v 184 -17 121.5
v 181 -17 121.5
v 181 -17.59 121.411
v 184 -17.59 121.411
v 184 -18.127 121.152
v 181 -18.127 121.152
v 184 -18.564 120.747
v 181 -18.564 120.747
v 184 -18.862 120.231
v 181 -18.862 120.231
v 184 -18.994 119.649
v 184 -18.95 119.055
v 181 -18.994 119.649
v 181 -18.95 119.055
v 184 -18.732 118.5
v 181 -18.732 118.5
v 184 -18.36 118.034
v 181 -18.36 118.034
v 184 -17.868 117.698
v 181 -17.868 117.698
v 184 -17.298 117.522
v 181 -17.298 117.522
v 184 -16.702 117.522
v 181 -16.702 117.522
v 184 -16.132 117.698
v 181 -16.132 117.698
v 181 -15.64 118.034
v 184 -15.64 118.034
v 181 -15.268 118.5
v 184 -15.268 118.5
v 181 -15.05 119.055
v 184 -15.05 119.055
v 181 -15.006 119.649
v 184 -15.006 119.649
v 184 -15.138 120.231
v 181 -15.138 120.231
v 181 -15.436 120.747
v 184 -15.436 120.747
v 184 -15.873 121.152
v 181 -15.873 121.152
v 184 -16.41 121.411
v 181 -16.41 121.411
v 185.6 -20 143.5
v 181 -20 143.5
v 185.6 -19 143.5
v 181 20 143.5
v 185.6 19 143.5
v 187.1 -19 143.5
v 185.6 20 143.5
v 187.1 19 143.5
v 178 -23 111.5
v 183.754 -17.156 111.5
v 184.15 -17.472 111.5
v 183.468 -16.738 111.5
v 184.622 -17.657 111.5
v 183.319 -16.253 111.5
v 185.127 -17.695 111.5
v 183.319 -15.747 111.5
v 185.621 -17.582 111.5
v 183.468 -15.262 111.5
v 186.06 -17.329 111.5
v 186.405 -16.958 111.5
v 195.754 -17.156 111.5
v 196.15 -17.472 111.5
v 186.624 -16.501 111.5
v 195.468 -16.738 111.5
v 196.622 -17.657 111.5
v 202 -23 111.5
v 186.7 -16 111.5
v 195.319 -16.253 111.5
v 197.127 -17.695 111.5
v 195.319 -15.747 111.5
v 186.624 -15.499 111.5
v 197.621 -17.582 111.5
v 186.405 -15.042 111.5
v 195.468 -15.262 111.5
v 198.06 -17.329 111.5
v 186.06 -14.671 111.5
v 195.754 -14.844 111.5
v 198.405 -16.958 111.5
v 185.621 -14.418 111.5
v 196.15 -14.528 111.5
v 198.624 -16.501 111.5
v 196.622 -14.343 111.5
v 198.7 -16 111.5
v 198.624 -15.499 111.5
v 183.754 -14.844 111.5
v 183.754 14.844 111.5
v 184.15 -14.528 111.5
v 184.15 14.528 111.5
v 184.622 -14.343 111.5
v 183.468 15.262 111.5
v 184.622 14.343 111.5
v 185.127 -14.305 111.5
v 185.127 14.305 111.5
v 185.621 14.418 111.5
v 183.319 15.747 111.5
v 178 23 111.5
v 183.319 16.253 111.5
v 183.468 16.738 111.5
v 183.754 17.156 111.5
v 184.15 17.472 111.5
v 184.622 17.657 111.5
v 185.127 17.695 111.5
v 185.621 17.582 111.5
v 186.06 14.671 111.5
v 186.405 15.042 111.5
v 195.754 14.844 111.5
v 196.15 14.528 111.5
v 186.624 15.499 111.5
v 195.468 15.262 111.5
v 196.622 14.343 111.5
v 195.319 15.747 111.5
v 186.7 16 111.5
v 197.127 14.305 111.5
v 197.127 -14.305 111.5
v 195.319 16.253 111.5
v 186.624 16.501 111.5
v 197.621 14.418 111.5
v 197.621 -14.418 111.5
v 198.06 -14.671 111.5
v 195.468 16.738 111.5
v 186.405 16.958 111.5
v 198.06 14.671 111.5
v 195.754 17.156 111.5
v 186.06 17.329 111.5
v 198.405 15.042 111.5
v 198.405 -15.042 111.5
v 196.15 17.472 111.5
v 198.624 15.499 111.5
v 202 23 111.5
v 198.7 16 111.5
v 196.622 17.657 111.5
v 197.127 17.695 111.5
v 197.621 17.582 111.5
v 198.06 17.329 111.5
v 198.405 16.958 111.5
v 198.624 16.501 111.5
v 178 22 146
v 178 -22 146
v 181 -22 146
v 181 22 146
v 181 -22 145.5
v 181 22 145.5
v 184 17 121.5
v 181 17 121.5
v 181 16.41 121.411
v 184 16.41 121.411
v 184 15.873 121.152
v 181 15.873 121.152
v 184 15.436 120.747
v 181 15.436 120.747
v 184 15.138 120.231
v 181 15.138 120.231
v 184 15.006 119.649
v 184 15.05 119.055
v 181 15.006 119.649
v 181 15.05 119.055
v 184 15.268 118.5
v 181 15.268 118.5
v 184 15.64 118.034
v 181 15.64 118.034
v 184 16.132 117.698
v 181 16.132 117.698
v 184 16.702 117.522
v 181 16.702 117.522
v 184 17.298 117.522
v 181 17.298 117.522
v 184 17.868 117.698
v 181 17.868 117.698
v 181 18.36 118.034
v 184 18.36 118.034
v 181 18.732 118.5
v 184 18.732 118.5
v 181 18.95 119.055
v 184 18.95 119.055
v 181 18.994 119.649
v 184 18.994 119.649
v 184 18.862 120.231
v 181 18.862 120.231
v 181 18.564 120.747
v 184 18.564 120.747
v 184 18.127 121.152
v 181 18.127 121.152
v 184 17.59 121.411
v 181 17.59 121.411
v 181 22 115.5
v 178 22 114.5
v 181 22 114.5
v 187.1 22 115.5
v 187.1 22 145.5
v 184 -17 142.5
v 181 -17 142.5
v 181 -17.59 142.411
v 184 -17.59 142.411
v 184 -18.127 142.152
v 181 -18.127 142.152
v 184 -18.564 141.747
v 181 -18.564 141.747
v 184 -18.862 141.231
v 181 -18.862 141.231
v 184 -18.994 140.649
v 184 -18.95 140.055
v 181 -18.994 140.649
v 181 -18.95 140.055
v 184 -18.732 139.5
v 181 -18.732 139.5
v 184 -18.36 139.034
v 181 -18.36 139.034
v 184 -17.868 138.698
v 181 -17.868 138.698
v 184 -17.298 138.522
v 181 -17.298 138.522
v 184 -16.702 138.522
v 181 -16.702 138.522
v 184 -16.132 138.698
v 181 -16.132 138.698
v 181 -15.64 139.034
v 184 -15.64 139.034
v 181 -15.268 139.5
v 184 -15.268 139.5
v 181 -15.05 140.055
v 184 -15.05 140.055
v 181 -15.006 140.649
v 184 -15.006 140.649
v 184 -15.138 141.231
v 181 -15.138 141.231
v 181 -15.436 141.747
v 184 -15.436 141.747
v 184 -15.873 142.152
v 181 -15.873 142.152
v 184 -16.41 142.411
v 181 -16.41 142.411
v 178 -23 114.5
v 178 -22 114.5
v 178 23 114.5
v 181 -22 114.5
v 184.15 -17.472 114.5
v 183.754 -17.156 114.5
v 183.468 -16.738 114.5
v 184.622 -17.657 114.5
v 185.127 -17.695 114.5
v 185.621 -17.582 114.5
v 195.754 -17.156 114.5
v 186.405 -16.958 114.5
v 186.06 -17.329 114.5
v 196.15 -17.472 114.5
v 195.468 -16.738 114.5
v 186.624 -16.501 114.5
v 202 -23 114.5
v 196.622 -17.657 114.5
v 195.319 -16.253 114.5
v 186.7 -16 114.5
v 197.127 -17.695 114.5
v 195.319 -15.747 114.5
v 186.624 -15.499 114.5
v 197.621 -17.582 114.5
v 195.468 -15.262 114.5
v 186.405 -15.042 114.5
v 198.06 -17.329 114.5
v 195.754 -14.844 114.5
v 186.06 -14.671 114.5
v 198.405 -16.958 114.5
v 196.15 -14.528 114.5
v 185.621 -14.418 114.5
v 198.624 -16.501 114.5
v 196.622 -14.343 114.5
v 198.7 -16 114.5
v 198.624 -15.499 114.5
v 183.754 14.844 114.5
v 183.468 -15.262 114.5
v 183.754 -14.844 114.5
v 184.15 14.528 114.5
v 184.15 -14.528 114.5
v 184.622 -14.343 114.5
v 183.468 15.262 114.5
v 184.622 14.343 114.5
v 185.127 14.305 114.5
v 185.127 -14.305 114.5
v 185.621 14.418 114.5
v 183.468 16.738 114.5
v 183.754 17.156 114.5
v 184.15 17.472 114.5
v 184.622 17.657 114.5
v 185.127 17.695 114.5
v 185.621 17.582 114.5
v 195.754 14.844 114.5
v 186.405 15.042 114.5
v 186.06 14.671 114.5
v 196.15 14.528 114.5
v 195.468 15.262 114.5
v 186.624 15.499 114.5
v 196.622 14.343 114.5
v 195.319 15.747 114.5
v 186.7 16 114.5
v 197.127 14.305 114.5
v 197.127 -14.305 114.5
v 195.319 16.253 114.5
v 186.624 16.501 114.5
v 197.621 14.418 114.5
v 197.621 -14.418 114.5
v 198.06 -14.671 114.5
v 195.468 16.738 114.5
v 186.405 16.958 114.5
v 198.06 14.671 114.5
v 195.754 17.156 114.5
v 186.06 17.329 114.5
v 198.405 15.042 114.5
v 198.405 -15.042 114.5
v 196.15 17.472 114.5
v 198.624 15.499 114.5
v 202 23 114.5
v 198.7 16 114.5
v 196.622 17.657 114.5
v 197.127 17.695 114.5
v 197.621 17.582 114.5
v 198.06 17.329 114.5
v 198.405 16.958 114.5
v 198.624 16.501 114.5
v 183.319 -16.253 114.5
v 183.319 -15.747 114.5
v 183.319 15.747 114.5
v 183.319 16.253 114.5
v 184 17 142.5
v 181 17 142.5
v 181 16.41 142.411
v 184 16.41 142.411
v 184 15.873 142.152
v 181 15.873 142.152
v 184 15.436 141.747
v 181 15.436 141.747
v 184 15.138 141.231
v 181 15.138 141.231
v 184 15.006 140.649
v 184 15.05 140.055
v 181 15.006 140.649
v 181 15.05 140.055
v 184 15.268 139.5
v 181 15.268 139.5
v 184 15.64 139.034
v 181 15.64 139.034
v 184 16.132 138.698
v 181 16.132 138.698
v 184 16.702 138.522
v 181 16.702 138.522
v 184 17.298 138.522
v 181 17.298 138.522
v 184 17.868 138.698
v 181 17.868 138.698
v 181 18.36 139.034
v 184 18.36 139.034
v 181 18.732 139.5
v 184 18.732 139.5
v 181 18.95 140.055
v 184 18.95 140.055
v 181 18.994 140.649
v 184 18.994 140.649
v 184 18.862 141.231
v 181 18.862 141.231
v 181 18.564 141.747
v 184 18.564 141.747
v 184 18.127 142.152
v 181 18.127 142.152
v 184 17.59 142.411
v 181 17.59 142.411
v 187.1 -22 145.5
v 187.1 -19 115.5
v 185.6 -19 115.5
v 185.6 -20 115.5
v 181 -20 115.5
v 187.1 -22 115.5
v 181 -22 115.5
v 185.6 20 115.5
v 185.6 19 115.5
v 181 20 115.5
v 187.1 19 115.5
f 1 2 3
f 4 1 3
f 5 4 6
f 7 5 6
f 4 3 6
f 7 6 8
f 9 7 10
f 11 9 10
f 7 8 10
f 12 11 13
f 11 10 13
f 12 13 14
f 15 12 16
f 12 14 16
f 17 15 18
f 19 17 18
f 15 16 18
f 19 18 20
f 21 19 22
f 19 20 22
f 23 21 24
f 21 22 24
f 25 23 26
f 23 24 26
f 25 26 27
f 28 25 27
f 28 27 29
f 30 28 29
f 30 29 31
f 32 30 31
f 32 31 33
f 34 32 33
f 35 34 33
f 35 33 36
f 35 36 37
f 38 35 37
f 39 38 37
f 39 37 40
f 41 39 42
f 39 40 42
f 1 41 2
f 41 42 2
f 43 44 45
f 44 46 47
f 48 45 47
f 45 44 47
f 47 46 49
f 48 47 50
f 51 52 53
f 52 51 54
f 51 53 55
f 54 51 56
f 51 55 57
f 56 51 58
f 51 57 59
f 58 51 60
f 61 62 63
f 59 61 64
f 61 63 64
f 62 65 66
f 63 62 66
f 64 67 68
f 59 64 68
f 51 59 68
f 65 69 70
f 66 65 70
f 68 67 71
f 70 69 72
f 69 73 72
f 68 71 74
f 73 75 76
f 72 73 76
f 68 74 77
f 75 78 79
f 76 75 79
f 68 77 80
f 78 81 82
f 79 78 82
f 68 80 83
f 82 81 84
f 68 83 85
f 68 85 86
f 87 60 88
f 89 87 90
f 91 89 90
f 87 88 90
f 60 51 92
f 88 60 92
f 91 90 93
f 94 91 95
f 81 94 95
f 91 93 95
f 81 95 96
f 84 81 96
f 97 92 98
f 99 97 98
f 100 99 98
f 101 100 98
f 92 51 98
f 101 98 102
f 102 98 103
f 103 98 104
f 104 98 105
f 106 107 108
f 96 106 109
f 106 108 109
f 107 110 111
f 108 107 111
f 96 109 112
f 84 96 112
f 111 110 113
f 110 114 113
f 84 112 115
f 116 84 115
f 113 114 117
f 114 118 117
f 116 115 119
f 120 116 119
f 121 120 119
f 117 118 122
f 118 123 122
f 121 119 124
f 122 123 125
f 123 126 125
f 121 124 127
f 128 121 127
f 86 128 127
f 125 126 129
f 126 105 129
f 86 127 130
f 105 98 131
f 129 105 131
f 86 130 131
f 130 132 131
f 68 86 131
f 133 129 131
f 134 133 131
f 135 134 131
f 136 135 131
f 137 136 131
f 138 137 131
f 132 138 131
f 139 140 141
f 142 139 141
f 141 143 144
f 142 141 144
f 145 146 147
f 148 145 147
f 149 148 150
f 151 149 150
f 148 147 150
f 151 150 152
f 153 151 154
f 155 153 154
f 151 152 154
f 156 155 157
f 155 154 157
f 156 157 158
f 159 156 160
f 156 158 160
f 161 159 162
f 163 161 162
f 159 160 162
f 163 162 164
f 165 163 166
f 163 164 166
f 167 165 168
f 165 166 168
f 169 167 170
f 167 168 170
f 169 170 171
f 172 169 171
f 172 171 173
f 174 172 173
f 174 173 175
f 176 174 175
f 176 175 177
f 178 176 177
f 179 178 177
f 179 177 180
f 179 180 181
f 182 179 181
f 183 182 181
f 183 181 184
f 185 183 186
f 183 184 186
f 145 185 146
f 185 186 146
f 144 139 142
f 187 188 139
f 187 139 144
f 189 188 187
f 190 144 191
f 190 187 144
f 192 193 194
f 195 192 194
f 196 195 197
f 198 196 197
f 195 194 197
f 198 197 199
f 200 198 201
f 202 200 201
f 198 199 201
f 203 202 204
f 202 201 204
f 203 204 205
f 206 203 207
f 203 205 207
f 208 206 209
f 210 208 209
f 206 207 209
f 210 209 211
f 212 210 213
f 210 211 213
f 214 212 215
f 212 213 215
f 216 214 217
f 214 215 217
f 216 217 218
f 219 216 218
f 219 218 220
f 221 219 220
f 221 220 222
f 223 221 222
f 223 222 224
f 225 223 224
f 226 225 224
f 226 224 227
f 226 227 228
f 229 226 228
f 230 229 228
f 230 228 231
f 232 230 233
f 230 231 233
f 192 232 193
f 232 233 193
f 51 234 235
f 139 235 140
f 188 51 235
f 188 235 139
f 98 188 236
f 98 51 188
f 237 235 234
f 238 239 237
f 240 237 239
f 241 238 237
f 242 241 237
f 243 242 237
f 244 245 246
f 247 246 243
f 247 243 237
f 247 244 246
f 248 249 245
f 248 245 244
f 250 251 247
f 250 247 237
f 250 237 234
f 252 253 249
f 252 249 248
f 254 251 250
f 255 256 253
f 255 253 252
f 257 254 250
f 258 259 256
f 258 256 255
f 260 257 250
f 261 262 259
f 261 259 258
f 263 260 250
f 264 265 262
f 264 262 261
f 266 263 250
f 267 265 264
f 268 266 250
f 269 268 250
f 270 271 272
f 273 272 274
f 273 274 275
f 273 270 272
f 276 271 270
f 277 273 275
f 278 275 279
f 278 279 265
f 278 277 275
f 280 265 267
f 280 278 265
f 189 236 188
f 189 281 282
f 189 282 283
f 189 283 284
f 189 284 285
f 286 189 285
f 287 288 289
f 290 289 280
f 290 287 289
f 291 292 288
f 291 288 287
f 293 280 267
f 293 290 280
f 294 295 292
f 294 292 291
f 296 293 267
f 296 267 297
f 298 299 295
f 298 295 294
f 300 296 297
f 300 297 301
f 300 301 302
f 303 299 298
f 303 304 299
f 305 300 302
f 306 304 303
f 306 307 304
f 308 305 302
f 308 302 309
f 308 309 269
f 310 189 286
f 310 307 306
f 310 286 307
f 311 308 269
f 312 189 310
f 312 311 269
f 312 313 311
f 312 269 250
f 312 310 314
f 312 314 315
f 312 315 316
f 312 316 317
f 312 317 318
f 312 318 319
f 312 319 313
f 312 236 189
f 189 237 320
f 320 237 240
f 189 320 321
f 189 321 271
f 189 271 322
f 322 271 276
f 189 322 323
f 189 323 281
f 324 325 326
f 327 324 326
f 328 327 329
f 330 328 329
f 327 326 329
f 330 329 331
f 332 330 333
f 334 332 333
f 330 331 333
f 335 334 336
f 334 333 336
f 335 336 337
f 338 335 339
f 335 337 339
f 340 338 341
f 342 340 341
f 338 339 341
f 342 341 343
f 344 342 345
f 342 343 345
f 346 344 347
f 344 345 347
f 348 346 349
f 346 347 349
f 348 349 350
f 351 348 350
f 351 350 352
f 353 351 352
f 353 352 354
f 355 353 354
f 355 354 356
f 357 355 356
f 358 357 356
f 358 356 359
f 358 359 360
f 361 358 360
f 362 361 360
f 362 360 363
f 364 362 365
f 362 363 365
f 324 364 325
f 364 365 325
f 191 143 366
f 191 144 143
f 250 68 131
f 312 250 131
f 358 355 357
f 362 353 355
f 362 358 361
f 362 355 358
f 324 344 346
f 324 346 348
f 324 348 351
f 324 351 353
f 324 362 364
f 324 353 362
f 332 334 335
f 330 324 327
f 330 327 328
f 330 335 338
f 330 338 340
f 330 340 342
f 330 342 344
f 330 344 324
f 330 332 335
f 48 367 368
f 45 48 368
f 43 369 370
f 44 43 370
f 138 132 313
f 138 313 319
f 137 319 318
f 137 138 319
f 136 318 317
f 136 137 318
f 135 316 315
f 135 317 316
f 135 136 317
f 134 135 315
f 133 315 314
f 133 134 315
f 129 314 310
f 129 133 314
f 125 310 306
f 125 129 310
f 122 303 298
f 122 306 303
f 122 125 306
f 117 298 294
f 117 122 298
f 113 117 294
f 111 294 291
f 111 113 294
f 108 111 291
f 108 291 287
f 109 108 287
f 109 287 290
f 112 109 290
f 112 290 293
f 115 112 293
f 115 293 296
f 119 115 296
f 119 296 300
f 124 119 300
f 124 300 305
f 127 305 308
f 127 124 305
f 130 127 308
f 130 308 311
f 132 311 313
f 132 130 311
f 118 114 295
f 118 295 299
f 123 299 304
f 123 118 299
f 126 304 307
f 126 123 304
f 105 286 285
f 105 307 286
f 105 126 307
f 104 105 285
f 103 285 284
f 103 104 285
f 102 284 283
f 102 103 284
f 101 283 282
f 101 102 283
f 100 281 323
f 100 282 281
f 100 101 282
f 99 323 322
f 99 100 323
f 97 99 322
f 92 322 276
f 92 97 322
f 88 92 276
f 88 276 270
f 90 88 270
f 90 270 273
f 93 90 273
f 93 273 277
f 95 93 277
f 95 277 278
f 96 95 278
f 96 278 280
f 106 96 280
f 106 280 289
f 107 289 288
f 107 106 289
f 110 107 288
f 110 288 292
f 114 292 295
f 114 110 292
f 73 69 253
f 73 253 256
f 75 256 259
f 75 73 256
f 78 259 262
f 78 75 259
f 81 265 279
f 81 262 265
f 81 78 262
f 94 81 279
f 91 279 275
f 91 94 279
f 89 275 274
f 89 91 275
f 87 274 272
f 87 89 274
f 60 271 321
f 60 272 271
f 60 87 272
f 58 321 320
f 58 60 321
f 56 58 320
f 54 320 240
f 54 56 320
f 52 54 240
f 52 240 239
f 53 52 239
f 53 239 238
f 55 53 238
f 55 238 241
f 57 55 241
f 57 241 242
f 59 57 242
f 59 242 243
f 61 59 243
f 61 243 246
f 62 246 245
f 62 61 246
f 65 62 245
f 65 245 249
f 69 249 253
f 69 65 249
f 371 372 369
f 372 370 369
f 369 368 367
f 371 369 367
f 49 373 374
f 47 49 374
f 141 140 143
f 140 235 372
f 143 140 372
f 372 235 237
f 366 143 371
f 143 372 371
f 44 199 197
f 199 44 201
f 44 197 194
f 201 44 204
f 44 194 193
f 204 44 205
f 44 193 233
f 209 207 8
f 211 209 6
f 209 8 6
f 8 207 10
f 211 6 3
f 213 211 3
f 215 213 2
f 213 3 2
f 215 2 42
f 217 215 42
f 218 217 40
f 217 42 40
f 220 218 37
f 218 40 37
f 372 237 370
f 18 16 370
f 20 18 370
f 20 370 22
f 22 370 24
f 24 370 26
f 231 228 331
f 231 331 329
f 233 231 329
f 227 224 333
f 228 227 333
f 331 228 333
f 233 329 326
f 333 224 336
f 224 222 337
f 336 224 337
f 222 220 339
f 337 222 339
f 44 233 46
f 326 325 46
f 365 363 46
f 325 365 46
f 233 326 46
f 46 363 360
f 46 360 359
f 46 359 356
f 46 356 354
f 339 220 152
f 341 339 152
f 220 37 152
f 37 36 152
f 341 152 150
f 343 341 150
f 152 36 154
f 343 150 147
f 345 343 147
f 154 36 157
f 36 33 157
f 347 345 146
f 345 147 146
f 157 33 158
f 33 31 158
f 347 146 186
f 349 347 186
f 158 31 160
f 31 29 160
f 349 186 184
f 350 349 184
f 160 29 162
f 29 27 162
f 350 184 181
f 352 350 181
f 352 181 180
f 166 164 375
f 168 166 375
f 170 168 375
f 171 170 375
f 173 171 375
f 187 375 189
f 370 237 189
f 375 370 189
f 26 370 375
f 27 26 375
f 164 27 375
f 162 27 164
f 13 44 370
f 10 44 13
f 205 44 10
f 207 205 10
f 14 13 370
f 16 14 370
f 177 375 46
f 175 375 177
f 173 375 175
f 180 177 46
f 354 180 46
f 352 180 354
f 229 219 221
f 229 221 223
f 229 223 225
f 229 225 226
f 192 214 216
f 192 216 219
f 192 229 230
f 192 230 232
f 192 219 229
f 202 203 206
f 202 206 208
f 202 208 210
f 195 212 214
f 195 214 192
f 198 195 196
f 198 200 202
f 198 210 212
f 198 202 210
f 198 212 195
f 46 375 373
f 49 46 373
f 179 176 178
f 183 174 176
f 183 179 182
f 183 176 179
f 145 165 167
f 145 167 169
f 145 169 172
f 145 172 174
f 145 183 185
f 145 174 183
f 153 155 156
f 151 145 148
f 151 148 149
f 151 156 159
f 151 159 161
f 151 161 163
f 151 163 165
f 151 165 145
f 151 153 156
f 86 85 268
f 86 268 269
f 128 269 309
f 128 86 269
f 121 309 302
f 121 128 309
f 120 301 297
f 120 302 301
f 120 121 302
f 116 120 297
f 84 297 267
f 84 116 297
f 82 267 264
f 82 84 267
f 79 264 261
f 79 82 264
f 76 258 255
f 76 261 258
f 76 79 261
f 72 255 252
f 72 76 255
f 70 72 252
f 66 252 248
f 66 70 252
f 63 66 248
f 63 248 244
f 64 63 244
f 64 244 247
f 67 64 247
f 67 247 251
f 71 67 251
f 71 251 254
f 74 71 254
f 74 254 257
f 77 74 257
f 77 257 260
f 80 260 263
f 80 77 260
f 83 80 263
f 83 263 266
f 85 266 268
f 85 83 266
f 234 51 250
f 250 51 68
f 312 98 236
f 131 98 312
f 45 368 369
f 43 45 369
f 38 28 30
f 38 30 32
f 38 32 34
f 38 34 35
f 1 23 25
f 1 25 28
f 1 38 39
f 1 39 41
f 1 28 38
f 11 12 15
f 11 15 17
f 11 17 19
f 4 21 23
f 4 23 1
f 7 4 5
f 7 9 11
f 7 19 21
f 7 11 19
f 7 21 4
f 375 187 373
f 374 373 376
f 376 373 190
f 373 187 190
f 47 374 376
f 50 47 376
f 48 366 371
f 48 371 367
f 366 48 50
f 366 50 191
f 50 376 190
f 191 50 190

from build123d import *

# Parameters (mm, degrees)
MOUNTING_FOOT_SKETCH_W      = 24
MOUNTING_FOOT_SKETCH_H      = 46
MOUNTING_FOOT_DEPTH         = 3
BACK_PLATE_SKETCH_W         = 3
BACK_PLATE_SKETCH_H         = 44
BACK_PLATE_DEPTH            = 31.5
CLIP_RAILS_DEPTH            = 30
TOP_RETAINING_RAIL_SKETCH_W = 6.1
TOP_RETAINING_RAIL_SKETCH_H = 40
TOP_RETAINING_RAIL_DEPTH    = 2
PCB_SUPPORT_SKETCH_R        = 2
PCB_SUPPORTS_DEPTH          = 3
MOUNTING_HOLES_SKETCH_R     = 1.7
MOUNTING_HOLES_DEPTH        = 3.2


with BuildPart() as part:
    # Mounting Foot Sketch → Mounting Foot (new body)
    with BuildSketch(Plane.XY.offset(111.5)):
        with Locations((190, 0)):
            Rectangle(MOUNTING_FOOT_SKETCH_W, MOUNTING_FOOT_SKETCH_H)
    extrude(amount=MOUNTING_FOOT_DEPTH)

    # Back Plate Sketch → Back Plate (add)
    with BuildSketch(Plane.XY.offset(114.5)):
        with Locations((179.5, 0)):
            Rectangle(BACK_PLATE_SKETCH_W, BACK_PLATE_SKETCH_H)
    extrude(amount=BACK_PLATE_DEPTH)

    # Clip Rail Sketch → Clip Rails (add)
    with BuildSketch(Plane.XY.offset(115.5)):
        Polygon((181, -22), (187.1, -22), (187.1, -19), (185.6, -19), (185.6, -20), (181, -20), align=None)
        Polygon((181, 20), (185.6, 20), (185.6, 19), (187.1, 19), (187.1, 22), (181, 22), align=None)
    extrude(amount=CLIP_RAILS_DEPTH)

    # Top Retaining Rail Sketch → Top Retaining Rail (add)
    with BuildSketch(Plane.XY.offset(143.5)):
        with Locations((184.05, 0)):
            Rectangle(TOP_RETAINING_RAIL_SKETCH_W, TOP_RETAINING_RAIL_SKETCH_H)
    extrude(amount=TOP_RETAINING_RAIL_DEPTH)

    # PCB Support Sketch → PCB Supports (add)
    with BuildSketch(Plane(origin=(181, 0, 0), x_dir=(0, 0, -1), z_dir=(1, 0, 0))):
        with Locations(Location((-119.5, -17, 0), (0, 0, 180))):
            Circle(PCB_SUPPORT_SKETCH_R)
        with Locations(Location((-140.5, -17, 0), (0, 0, 180))):
            Circle(PCB_SUPPORT_SKETCH_R)
        with Locations(Location((-119.5, 17, 0), (0, 0, 180))):
            Circle(PCB_SUPPORT_SKETCH_R)
        with Locations(Location((-140.5, 17, 0), (0, 0, 180))):
            Circle(PCB_SUPPORT_SKETCH_R)
    extrude(amount=PCB_SUPPORTS_DEPTH)

    # Mounting Holes Sketch → Mounting Holes (cut)
    with BuildSketch(Plane.XY.offset(111.4)):
        with Locations((185, -16)):
            Circle(MOUNTING_HOLES_SKETCH_R)
        with Locations((185, 16)):
            Circle(MOUNTING_HOLES_SKETCH_R)
        with Locations((197, -16)):
            Circle(MOUNTING_HOLES_SKETCH_R)
        with Locations((197, 16)):
            Circle(MOUNTING_HOLES_SKETCH_R)
    extrude(amount=MOUNTING_HOLES_DEPTH, mode=Mode.SUBTRACT)


solid = part.part
